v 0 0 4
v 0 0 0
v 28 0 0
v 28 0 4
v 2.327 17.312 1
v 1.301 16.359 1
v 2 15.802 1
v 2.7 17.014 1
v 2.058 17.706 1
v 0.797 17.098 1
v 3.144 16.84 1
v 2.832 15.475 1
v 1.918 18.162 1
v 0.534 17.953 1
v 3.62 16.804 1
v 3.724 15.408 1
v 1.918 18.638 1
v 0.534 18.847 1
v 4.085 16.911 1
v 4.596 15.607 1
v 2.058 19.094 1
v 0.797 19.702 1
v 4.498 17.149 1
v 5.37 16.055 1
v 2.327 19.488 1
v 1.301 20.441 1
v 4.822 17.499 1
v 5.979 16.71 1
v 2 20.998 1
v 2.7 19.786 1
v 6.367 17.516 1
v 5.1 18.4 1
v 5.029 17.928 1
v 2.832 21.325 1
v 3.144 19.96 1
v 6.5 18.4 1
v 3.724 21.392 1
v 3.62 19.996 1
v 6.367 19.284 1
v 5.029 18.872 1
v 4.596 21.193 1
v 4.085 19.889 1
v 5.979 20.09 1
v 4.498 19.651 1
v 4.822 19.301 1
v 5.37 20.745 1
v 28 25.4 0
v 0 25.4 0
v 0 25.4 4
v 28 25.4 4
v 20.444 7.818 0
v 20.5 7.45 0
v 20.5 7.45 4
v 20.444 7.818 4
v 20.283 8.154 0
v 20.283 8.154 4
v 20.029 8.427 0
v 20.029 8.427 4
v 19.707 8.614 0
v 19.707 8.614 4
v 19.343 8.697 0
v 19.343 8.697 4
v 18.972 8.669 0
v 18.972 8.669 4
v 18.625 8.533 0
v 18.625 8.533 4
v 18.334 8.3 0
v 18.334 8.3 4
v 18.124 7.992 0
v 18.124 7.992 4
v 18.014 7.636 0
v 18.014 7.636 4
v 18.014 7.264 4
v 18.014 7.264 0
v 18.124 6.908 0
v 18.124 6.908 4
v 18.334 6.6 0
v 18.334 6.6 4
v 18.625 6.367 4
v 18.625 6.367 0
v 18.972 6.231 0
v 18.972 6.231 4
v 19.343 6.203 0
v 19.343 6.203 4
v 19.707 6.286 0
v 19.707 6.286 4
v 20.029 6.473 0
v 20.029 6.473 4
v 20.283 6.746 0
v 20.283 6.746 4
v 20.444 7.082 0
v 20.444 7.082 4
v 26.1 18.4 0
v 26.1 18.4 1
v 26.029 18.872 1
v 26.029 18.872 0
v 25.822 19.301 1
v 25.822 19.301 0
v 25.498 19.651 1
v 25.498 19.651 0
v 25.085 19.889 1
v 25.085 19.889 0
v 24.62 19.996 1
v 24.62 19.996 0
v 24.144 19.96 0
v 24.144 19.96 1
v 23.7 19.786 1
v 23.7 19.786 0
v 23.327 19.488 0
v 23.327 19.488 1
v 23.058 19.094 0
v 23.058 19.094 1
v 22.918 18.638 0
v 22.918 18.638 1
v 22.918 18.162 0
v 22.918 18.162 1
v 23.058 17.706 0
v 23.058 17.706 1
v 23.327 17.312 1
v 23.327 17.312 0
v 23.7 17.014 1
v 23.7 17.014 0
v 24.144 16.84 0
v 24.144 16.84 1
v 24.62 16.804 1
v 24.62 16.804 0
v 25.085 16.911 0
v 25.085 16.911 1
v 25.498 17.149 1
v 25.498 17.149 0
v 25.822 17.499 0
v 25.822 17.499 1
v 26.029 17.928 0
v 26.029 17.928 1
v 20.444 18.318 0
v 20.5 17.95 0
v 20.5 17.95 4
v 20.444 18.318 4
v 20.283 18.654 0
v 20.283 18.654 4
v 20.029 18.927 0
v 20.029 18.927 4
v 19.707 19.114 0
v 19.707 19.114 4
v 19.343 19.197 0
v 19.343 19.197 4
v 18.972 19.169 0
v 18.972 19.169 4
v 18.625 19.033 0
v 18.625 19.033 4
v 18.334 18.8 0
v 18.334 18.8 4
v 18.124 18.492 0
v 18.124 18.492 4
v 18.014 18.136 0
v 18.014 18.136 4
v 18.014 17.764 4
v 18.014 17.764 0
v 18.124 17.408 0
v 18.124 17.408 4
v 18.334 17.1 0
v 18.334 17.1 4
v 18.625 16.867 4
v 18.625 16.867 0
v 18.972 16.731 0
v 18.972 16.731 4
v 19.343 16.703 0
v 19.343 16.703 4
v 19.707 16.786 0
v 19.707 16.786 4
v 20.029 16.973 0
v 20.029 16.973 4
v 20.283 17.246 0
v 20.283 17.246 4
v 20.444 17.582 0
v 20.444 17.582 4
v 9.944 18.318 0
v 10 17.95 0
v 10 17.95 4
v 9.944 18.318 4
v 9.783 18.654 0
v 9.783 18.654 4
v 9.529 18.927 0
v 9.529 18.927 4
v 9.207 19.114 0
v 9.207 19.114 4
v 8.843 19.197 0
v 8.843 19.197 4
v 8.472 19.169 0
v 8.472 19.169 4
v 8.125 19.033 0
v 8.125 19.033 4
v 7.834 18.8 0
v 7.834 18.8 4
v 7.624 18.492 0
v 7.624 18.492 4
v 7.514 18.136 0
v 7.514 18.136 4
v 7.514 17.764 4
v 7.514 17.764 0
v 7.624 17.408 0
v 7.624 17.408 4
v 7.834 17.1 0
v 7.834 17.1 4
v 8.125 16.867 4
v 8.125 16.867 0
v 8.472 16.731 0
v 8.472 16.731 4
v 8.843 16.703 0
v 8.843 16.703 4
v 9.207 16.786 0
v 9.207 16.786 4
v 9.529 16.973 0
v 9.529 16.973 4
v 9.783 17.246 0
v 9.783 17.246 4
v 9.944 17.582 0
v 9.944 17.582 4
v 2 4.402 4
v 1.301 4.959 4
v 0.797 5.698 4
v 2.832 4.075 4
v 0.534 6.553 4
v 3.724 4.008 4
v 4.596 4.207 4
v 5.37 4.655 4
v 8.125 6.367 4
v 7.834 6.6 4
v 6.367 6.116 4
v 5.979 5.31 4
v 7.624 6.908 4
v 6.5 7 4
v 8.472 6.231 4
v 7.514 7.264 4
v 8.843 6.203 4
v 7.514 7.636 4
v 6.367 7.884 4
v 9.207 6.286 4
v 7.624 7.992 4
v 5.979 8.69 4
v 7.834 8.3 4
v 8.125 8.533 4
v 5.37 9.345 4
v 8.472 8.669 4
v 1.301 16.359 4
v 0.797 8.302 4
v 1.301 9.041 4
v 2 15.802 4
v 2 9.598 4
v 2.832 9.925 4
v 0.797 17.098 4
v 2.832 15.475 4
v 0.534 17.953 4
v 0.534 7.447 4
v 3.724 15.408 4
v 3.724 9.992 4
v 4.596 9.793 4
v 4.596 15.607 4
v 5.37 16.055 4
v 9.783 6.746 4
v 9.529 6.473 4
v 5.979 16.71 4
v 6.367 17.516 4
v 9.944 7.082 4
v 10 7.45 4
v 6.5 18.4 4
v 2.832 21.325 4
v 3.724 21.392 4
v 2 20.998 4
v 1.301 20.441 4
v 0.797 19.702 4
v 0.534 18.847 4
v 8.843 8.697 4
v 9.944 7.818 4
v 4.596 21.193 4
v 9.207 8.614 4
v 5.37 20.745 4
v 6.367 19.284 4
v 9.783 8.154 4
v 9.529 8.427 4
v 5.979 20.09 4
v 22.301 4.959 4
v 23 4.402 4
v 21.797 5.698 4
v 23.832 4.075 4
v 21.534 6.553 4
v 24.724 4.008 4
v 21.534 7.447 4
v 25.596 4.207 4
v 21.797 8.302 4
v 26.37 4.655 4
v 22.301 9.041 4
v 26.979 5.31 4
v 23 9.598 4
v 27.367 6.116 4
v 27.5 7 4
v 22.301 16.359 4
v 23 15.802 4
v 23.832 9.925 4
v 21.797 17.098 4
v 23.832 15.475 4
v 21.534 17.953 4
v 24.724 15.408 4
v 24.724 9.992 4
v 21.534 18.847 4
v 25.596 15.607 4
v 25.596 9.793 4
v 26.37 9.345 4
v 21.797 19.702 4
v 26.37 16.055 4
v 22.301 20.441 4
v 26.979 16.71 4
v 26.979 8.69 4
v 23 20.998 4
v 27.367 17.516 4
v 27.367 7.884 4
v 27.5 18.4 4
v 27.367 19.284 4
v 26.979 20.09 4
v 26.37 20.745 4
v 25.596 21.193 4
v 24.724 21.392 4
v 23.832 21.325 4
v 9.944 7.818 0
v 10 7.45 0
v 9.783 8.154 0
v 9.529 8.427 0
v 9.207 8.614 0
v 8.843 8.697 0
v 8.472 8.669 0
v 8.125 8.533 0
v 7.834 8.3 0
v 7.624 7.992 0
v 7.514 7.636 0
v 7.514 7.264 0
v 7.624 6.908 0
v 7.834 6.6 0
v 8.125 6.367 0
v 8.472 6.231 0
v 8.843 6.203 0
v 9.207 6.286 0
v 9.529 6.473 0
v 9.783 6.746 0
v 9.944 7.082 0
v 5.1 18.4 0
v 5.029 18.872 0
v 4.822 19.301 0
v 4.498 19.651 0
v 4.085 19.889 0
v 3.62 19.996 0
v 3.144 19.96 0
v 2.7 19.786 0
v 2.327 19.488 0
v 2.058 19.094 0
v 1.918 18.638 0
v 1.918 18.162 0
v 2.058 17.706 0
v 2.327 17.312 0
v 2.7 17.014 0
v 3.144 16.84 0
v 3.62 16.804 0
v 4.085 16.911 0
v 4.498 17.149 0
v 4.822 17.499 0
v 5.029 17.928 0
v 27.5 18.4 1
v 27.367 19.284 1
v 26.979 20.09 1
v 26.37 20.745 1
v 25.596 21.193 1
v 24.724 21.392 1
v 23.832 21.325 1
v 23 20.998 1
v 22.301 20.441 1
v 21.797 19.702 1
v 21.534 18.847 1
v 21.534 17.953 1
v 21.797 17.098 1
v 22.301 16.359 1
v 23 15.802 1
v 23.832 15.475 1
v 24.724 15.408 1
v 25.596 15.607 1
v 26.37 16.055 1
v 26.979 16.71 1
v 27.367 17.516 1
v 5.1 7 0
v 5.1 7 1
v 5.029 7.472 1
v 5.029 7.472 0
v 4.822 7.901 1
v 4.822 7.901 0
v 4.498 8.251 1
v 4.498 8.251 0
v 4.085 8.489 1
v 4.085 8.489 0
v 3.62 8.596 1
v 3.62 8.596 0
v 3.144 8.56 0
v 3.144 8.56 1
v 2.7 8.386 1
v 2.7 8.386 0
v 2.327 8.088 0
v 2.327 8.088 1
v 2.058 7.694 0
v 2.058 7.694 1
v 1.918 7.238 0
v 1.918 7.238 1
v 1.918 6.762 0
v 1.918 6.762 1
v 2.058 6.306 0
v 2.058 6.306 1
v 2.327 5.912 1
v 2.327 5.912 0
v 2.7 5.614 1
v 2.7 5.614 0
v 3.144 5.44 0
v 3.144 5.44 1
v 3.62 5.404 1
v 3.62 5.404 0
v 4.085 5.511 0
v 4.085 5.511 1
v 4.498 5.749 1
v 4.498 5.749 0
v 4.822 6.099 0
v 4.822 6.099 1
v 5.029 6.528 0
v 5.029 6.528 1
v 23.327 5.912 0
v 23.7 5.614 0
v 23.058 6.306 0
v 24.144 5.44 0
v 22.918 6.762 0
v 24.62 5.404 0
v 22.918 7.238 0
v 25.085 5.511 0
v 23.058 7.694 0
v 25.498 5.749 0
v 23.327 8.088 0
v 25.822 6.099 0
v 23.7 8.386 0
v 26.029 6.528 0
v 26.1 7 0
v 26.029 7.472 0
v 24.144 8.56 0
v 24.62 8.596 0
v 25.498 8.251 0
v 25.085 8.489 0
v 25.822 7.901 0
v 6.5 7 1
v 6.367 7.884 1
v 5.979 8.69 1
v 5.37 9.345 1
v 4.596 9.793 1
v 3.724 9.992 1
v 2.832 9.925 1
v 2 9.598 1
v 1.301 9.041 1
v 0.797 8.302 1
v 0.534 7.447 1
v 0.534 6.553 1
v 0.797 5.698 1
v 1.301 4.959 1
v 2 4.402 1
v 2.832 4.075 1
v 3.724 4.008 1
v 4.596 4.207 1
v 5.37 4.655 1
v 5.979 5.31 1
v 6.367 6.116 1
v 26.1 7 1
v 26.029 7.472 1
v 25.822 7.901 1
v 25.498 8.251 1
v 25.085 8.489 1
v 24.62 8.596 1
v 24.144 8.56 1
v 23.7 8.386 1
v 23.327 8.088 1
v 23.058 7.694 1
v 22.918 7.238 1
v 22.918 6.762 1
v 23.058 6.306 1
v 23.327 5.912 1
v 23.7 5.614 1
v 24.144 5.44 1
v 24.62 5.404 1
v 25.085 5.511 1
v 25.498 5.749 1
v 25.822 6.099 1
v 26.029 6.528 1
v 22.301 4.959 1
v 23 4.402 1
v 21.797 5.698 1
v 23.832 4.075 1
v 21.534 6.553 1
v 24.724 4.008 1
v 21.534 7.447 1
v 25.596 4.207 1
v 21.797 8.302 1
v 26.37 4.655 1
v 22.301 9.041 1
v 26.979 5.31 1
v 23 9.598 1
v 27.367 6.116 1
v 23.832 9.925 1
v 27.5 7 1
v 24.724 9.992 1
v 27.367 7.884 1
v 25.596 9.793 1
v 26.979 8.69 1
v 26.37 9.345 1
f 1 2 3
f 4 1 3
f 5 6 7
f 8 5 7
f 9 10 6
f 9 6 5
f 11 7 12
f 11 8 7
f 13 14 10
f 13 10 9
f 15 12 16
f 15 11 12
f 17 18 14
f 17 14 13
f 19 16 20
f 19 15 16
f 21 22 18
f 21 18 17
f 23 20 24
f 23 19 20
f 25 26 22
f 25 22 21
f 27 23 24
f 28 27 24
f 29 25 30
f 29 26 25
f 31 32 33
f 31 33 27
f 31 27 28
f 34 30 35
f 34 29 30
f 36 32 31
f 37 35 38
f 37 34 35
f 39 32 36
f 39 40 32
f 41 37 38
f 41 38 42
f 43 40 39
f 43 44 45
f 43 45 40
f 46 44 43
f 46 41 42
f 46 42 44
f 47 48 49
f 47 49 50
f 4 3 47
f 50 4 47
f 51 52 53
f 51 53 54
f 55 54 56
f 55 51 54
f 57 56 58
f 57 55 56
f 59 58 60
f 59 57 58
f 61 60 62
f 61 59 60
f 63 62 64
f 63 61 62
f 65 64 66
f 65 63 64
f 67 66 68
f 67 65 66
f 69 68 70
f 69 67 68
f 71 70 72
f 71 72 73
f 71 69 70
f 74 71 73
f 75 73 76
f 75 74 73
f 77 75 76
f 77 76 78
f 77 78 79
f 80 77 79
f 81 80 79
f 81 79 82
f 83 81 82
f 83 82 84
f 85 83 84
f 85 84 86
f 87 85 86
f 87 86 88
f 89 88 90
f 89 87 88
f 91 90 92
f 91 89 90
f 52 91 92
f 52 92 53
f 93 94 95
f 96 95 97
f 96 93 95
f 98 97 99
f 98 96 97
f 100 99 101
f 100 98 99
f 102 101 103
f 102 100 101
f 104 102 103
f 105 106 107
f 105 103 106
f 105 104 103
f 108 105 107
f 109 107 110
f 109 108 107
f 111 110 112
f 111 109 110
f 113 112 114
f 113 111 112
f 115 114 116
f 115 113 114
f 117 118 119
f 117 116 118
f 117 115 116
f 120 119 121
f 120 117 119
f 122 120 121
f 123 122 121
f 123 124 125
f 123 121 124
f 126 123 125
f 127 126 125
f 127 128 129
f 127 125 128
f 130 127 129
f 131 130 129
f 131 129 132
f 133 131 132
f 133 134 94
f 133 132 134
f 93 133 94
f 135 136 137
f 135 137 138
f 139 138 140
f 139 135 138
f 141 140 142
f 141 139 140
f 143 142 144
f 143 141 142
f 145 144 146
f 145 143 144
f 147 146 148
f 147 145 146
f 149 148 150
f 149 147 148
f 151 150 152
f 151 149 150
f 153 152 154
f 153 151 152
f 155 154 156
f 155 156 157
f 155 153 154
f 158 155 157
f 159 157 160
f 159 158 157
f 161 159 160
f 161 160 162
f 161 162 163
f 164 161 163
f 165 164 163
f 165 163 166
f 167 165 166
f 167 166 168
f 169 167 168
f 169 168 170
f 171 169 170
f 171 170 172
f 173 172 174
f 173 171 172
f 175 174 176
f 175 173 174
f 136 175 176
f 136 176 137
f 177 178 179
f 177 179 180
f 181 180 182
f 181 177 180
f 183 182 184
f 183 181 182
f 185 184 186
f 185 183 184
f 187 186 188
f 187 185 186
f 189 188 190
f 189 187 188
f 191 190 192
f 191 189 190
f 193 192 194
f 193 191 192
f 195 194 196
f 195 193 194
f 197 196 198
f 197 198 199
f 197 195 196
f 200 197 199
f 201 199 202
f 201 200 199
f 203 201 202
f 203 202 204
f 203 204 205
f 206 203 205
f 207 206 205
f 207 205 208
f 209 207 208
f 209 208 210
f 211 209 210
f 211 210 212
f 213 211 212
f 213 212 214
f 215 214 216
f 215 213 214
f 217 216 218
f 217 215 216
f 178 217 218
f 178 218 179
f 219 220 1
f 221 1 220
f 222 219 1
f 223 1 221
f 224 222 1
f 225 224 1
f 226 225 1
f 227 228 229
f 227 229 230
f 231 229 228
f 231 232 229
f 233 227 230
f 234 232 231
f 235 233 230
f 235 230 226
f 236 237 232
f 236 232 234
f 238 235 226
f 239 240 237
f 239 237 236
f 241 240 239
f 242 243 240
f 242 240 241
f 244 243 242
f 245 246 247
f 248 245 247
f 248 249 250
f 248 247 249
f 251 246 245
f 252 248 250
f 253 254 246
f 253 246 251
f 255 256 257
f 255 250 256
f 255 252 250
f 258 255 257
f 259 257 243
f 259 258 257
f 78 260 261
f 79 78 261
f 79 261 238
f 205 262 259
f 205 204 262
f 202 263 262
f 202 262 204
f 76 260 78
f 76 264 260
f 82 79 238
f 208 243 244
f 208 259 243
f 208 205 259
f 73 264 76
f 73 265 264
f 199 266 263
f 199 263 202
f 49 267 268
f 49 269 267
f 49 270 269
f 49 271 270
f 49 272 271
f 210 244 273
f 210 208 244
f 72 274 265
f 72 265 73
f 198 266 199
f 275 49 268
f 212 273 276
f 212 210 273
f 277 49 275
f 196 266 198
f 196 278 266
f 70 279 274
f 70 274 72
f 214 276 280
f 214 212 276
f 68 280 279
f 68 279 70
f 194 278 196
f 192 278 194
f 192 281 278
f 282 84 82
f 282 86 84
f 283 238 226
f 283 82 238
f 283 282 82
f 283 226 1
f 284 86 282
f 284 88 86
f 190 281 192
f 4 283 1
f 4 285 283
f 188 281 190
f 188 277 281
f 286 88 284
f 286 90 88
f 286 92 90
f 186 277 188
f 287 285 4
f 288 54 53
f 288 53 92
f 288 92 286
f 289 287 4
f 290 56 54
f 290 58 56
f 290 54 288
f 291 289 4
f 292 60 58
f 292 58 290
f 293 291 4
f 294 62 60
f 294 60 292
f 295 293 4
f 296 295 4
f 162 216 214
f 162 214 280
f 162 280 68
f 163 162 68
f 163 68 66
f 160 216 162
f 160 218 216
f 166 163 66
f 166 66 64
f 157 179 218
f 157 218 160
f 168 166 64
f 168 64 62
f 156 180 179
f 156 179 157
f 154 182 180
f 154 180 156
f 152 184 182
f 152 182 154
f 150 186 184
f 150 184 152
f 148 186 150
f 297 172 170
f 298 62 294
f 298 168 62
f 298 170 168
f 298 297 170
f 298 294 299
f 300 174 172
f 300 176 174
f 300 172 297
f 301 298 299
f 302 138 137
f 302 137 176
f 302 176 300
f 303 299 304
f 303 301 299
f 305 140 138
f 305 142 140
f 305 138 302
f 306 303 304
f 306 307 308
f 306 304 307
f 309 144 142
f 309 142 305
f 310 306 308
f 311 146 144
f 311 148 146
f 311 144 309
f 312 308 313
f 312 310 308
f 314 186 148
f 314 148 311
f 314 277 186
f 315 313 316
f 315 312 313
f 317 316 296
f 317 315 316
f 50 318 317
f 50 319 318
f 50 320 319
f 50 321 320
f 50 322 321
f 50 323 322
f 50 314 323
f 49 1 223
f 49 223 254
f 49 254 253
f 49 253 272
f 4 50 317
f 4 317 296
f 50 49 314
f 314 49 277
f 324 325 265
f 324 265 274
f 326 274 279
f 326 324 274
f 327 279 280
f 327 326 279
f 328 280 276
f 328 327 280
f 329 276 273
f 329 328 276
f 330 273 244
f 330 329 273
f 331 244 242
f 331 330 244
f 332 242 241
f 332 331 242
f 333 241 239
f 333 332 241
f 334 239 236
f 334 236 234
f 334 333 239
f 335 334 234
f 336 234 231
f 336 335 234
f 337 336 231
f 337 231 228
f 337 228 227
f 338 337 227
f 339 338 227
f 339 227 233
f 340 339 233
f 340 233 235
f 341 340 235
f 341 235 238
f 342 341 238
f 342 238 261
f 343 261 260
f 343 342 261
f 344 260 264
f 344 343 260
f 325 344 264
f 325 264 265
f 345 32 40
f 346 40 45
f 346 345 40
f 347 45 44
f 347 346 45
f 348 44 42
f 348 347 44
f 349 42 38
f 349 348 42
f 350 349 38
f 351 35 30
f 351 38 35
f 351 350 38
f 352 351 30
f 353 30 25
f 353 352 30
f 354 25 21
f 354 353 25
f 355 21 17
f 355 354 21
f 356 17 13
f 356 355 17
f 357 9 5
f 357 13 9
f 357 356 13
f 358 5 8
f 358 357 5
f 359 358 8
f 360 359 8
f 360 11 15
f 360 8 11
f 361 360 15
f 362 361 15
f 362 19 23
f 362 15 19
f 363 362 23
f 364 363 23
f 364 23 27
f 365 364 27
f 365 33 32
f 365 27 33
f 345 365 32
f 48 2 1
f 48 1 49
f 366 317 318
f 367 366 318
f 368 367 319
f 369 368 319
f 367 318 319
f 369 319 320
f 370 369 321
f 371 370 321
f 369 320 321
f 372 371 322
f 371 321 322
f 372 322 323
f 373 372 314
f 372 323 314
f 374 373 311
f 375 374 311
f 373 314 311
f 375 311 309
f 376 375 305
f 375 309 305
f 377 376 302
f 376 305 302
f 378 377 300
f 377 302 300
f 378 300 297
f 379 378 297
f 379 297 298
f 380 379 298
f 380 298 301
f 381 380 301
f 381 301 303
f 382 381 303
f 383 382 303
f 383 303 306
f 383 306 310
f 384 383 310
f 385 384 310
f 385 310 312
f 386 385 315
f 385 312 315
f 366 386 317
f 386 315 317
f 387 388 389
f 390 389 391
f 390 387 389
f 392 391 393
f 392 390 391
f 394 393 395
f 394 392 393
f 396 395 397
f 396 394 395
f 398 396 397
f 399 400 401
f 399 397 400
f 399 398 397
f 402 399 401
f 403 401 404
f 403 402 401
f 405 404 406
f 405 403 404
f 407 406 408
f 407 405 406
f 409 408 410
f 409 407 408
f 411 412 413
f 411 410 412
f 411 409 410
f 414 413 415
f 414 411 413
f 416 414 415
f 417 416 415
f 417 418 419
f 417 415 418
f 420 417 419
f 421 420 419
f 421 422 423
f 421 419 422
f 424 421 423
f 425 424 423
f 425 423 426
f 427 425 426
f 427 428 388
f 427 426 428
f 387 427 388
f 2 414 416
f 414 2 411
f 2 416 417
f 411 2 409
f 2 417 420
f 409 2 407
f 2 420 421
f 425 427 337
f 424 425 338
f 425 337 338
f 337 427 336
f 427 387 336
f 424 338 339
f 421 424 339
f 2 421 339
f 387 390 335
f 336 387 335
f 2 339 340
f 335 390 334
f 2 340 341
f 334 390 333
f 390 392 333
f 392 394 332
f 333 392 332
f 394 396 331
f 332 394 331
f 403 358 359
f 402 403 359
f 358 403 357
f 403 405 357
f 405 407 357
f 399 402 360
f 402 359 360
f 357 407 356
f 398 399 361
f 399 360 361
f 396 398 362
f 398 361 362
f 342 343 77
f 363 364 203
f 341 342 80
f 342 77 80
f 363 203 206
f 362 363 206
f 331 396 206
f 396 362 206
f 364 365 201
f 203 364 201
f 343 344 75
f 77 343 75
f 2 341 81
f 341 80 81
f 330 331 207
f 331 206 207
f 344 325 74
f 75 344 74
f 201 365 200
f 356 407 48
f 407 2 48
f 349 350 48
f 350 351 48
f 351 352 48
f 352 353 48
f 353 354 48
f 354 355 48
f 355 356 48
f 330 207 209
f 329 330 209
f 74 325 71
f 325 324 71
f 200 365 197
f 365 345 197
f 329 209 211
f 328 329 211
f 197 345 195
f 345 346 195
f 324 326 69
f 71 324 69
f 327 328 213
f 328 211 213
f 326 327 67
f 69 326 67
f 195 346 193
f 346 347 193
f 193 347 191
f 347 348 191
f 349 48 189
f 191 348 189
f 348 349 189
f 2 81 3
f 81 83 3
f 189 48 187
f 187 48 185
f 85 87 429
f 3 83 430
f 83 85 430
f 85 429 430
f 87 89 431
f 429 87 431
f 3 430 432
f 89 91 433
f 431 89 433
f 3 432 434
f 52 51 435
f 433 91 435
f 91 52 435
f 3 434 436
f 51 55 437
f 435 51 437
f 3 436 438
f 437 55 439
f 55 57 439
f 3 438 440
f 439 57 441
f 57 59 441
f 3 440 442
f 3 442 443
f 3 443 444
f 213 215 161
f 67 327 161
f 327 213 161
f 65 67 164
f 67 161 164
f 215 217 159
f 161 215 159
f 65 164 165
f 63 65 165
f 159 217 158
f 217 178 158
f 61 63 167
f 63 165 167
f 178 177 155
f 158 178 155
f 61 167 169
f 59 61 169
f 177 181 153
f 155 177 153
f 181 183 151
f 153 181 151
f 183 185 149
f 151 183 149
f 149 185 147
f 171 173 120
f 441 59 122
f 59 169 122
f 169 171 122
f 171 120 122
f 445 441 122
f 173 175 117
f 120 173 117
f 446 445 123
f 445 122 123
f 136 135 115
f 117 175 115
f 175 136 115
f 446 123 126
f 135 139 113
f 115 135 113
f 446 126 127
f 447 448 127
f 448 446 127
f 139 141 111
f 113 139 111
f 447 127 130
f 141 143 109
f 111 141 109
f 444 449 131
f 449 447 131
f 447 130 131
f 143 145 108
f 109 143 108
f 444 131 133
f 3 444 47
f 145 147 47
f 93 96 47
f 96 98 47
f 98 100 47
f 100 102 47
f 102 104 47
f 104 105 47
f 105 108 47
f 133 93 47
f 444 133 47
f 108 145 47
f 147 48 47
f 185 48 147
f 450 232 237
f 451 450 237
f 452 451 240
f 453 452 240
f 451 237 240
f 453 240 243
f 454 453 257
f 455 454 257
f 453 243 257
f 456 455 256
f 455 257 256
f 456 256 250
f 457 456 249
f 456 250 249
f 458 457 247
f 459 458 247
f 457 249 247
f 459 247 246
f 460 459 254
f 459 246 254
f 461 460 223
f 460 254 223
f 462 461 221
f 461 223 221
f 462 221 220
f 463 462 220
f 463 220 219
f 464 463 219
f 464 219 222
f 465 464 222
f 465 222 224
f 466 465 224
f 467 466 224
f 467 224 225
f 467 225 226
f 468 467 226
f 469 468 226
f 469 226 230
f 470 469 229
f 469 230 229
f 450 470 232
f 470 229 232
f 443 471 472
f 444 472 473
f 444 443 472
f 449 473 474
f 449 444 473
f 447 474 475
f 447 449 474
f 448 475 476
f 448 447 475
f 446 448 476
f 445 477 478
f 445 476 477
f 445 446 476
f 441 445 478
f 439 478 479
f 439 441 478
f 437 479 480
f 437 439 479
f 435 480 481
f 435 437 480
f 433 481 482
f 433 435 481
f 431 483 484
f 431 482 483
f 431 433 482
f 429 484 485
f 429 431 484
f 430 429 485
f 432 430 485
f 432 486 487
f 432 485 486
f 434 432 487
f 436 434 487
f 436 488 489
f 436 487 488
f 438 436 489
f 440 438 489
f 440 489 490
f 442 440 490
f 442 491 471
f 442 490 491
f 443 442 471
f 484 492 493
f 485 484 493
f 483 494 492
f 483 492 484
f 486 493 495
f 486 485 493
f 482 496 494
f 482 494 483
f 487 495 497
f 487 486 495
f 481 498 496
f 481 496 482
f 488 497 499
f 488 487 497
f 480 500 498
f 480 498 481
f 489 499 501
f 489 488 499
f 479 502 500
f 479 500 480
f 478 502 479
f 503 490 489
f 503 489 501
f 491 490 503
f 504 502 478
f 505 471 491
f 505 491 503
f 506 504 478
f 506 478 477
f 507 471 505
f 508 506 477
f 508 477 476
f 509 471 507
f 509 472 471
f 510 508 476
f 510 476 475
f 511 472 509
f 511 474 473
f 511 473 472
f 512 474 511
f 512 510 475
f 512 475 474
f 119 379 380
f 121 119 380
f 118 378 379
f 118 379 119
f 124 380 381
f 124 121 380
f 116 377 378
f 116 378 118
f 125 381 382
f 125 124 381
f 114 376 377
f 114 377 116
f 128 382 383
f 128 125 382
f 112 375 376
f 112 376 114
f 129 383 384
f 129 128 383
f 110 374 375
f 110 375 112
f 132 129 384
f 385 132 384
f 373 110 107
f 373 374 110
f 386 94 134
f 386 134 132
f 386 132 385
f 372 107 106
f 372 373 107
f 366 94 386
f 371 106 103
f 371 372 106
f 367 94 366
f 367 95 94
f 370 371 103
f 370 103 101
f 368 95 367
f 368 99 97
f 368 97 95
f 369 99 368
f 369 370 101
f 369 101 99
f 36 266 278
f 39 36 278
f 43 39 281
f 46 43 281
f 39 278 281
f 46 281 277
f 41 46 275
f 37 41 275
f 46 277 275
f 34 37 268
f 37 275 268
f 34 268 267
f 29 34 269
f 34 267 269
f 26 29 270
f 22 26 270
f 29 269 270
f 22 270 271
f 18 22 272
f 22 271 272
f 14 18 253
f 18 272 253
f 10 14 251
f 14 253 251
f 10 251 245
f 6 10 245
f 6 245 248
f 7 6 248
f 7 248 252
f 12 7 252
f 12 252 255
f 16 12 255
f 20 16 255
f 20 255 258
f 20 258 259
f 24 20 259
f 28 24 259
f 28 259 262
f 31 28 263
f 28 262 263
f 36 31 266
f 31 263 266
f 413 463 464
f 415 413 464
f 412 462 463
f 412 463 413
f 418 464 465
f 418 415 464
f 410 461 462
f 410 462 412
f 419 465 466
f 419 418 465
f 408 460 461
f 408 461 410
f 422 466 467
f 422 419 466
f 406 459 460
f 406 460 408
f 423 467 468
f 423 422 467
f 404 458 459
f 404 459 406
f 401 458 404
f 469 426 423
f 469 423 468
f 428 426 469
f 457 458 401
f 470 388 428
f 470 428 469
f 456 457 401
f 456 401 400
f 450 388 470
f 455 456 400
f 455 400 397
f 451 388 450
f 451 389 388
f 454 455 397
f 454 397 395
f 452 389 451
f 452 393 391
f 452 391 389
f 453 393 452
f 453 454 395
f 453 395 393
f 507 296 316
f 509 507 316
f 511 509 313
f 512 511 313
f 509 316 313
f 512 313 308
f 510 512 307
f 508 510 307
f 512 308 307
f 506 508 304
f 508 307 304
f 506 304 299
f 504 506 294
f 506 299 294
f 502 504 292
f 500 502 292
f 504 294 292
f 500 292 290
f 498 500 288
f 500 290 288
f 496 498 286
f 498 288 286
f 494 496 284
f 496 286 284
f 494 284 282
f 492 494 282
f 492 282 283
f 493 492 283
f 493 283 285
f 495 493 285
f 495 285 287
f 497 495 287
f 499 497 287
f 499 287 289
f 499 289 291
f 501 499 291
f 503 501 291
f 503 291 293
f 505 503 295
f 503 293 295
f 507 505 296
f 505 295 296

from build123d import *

# Parameters (mm, degrees)
SKETCH1_W           = 28
SKETCH1_H           = 25.4
SKETCH1_R           = 1.25
SKETCH1_R_2         = 1.6
BOSS_EXTRUDE1_DEPTH = 4
SKETCH2_R           = 3
CUT_EXTRUDE1_DEPTH  = 3


with BuildPart() as part:
    # Sketch1 → Boss-Extrude1 (new body)
    with BuildSketch(Plane.XY):
        with Locations((14, 12.7)):
            Rectangle(SKETCH1_W, SKETCH1_H)
        with Locations((8.75, 17.95)):
            Circle(SKETCH1_R, mode=Mode.SUBTRACT)
        with Locations((19.25, 17.95)):
            Circle(SKETCH1_R, mode=Mode.SUBTRACT)
        with Locations((19.25, 7.45)):
            Circle(SKETCH1_R, mode=Mode.SUBTRACT)
        with Locations((8.75, 7.45)):
            Circle(SKETCH1_R, mode=Mode.SUBTRACT)
        with Locations((3.5, 18.4)):
            Circle(SKETCH1_R_2, mode=Mode.SUBTRACT)
        with Locations((3.5, 7)):
            Circle(SKETCH1_R_2, mode=Mode.SUBTRACT)
        with Locations((24.5, 7)):
            Circle(SKETCH1_R_2, mode=Mode.SUBTRACT)
        with Locations((24.5, 18.4)):
            Circle(SKETCH1_R_2, mode=Mode.SUBTRACT)
    extrude(amount=BOSS_EXTRUDE1_DEPTH)

    # Sketch2 → Cut-Extrude1 (cut)
    with BuildSketch(Plane.XY.offset(4)):
        with Locations((24.5, 18.4)):
            Circle(SKETCH2_R)
        with Locations((3.5, 18.4)):
            Circle(SKETCH2_R)
        with Locations((3.5, 7)):
            Circle(SKETCH2_R)
        with Locations((24.5, 7)):
            Circle(SKETCH2_R)
    extrude(amount=-CUT_EXTRUDE1_DEPTH, mode=Mode.SUBTRACT)


solid = part.part
